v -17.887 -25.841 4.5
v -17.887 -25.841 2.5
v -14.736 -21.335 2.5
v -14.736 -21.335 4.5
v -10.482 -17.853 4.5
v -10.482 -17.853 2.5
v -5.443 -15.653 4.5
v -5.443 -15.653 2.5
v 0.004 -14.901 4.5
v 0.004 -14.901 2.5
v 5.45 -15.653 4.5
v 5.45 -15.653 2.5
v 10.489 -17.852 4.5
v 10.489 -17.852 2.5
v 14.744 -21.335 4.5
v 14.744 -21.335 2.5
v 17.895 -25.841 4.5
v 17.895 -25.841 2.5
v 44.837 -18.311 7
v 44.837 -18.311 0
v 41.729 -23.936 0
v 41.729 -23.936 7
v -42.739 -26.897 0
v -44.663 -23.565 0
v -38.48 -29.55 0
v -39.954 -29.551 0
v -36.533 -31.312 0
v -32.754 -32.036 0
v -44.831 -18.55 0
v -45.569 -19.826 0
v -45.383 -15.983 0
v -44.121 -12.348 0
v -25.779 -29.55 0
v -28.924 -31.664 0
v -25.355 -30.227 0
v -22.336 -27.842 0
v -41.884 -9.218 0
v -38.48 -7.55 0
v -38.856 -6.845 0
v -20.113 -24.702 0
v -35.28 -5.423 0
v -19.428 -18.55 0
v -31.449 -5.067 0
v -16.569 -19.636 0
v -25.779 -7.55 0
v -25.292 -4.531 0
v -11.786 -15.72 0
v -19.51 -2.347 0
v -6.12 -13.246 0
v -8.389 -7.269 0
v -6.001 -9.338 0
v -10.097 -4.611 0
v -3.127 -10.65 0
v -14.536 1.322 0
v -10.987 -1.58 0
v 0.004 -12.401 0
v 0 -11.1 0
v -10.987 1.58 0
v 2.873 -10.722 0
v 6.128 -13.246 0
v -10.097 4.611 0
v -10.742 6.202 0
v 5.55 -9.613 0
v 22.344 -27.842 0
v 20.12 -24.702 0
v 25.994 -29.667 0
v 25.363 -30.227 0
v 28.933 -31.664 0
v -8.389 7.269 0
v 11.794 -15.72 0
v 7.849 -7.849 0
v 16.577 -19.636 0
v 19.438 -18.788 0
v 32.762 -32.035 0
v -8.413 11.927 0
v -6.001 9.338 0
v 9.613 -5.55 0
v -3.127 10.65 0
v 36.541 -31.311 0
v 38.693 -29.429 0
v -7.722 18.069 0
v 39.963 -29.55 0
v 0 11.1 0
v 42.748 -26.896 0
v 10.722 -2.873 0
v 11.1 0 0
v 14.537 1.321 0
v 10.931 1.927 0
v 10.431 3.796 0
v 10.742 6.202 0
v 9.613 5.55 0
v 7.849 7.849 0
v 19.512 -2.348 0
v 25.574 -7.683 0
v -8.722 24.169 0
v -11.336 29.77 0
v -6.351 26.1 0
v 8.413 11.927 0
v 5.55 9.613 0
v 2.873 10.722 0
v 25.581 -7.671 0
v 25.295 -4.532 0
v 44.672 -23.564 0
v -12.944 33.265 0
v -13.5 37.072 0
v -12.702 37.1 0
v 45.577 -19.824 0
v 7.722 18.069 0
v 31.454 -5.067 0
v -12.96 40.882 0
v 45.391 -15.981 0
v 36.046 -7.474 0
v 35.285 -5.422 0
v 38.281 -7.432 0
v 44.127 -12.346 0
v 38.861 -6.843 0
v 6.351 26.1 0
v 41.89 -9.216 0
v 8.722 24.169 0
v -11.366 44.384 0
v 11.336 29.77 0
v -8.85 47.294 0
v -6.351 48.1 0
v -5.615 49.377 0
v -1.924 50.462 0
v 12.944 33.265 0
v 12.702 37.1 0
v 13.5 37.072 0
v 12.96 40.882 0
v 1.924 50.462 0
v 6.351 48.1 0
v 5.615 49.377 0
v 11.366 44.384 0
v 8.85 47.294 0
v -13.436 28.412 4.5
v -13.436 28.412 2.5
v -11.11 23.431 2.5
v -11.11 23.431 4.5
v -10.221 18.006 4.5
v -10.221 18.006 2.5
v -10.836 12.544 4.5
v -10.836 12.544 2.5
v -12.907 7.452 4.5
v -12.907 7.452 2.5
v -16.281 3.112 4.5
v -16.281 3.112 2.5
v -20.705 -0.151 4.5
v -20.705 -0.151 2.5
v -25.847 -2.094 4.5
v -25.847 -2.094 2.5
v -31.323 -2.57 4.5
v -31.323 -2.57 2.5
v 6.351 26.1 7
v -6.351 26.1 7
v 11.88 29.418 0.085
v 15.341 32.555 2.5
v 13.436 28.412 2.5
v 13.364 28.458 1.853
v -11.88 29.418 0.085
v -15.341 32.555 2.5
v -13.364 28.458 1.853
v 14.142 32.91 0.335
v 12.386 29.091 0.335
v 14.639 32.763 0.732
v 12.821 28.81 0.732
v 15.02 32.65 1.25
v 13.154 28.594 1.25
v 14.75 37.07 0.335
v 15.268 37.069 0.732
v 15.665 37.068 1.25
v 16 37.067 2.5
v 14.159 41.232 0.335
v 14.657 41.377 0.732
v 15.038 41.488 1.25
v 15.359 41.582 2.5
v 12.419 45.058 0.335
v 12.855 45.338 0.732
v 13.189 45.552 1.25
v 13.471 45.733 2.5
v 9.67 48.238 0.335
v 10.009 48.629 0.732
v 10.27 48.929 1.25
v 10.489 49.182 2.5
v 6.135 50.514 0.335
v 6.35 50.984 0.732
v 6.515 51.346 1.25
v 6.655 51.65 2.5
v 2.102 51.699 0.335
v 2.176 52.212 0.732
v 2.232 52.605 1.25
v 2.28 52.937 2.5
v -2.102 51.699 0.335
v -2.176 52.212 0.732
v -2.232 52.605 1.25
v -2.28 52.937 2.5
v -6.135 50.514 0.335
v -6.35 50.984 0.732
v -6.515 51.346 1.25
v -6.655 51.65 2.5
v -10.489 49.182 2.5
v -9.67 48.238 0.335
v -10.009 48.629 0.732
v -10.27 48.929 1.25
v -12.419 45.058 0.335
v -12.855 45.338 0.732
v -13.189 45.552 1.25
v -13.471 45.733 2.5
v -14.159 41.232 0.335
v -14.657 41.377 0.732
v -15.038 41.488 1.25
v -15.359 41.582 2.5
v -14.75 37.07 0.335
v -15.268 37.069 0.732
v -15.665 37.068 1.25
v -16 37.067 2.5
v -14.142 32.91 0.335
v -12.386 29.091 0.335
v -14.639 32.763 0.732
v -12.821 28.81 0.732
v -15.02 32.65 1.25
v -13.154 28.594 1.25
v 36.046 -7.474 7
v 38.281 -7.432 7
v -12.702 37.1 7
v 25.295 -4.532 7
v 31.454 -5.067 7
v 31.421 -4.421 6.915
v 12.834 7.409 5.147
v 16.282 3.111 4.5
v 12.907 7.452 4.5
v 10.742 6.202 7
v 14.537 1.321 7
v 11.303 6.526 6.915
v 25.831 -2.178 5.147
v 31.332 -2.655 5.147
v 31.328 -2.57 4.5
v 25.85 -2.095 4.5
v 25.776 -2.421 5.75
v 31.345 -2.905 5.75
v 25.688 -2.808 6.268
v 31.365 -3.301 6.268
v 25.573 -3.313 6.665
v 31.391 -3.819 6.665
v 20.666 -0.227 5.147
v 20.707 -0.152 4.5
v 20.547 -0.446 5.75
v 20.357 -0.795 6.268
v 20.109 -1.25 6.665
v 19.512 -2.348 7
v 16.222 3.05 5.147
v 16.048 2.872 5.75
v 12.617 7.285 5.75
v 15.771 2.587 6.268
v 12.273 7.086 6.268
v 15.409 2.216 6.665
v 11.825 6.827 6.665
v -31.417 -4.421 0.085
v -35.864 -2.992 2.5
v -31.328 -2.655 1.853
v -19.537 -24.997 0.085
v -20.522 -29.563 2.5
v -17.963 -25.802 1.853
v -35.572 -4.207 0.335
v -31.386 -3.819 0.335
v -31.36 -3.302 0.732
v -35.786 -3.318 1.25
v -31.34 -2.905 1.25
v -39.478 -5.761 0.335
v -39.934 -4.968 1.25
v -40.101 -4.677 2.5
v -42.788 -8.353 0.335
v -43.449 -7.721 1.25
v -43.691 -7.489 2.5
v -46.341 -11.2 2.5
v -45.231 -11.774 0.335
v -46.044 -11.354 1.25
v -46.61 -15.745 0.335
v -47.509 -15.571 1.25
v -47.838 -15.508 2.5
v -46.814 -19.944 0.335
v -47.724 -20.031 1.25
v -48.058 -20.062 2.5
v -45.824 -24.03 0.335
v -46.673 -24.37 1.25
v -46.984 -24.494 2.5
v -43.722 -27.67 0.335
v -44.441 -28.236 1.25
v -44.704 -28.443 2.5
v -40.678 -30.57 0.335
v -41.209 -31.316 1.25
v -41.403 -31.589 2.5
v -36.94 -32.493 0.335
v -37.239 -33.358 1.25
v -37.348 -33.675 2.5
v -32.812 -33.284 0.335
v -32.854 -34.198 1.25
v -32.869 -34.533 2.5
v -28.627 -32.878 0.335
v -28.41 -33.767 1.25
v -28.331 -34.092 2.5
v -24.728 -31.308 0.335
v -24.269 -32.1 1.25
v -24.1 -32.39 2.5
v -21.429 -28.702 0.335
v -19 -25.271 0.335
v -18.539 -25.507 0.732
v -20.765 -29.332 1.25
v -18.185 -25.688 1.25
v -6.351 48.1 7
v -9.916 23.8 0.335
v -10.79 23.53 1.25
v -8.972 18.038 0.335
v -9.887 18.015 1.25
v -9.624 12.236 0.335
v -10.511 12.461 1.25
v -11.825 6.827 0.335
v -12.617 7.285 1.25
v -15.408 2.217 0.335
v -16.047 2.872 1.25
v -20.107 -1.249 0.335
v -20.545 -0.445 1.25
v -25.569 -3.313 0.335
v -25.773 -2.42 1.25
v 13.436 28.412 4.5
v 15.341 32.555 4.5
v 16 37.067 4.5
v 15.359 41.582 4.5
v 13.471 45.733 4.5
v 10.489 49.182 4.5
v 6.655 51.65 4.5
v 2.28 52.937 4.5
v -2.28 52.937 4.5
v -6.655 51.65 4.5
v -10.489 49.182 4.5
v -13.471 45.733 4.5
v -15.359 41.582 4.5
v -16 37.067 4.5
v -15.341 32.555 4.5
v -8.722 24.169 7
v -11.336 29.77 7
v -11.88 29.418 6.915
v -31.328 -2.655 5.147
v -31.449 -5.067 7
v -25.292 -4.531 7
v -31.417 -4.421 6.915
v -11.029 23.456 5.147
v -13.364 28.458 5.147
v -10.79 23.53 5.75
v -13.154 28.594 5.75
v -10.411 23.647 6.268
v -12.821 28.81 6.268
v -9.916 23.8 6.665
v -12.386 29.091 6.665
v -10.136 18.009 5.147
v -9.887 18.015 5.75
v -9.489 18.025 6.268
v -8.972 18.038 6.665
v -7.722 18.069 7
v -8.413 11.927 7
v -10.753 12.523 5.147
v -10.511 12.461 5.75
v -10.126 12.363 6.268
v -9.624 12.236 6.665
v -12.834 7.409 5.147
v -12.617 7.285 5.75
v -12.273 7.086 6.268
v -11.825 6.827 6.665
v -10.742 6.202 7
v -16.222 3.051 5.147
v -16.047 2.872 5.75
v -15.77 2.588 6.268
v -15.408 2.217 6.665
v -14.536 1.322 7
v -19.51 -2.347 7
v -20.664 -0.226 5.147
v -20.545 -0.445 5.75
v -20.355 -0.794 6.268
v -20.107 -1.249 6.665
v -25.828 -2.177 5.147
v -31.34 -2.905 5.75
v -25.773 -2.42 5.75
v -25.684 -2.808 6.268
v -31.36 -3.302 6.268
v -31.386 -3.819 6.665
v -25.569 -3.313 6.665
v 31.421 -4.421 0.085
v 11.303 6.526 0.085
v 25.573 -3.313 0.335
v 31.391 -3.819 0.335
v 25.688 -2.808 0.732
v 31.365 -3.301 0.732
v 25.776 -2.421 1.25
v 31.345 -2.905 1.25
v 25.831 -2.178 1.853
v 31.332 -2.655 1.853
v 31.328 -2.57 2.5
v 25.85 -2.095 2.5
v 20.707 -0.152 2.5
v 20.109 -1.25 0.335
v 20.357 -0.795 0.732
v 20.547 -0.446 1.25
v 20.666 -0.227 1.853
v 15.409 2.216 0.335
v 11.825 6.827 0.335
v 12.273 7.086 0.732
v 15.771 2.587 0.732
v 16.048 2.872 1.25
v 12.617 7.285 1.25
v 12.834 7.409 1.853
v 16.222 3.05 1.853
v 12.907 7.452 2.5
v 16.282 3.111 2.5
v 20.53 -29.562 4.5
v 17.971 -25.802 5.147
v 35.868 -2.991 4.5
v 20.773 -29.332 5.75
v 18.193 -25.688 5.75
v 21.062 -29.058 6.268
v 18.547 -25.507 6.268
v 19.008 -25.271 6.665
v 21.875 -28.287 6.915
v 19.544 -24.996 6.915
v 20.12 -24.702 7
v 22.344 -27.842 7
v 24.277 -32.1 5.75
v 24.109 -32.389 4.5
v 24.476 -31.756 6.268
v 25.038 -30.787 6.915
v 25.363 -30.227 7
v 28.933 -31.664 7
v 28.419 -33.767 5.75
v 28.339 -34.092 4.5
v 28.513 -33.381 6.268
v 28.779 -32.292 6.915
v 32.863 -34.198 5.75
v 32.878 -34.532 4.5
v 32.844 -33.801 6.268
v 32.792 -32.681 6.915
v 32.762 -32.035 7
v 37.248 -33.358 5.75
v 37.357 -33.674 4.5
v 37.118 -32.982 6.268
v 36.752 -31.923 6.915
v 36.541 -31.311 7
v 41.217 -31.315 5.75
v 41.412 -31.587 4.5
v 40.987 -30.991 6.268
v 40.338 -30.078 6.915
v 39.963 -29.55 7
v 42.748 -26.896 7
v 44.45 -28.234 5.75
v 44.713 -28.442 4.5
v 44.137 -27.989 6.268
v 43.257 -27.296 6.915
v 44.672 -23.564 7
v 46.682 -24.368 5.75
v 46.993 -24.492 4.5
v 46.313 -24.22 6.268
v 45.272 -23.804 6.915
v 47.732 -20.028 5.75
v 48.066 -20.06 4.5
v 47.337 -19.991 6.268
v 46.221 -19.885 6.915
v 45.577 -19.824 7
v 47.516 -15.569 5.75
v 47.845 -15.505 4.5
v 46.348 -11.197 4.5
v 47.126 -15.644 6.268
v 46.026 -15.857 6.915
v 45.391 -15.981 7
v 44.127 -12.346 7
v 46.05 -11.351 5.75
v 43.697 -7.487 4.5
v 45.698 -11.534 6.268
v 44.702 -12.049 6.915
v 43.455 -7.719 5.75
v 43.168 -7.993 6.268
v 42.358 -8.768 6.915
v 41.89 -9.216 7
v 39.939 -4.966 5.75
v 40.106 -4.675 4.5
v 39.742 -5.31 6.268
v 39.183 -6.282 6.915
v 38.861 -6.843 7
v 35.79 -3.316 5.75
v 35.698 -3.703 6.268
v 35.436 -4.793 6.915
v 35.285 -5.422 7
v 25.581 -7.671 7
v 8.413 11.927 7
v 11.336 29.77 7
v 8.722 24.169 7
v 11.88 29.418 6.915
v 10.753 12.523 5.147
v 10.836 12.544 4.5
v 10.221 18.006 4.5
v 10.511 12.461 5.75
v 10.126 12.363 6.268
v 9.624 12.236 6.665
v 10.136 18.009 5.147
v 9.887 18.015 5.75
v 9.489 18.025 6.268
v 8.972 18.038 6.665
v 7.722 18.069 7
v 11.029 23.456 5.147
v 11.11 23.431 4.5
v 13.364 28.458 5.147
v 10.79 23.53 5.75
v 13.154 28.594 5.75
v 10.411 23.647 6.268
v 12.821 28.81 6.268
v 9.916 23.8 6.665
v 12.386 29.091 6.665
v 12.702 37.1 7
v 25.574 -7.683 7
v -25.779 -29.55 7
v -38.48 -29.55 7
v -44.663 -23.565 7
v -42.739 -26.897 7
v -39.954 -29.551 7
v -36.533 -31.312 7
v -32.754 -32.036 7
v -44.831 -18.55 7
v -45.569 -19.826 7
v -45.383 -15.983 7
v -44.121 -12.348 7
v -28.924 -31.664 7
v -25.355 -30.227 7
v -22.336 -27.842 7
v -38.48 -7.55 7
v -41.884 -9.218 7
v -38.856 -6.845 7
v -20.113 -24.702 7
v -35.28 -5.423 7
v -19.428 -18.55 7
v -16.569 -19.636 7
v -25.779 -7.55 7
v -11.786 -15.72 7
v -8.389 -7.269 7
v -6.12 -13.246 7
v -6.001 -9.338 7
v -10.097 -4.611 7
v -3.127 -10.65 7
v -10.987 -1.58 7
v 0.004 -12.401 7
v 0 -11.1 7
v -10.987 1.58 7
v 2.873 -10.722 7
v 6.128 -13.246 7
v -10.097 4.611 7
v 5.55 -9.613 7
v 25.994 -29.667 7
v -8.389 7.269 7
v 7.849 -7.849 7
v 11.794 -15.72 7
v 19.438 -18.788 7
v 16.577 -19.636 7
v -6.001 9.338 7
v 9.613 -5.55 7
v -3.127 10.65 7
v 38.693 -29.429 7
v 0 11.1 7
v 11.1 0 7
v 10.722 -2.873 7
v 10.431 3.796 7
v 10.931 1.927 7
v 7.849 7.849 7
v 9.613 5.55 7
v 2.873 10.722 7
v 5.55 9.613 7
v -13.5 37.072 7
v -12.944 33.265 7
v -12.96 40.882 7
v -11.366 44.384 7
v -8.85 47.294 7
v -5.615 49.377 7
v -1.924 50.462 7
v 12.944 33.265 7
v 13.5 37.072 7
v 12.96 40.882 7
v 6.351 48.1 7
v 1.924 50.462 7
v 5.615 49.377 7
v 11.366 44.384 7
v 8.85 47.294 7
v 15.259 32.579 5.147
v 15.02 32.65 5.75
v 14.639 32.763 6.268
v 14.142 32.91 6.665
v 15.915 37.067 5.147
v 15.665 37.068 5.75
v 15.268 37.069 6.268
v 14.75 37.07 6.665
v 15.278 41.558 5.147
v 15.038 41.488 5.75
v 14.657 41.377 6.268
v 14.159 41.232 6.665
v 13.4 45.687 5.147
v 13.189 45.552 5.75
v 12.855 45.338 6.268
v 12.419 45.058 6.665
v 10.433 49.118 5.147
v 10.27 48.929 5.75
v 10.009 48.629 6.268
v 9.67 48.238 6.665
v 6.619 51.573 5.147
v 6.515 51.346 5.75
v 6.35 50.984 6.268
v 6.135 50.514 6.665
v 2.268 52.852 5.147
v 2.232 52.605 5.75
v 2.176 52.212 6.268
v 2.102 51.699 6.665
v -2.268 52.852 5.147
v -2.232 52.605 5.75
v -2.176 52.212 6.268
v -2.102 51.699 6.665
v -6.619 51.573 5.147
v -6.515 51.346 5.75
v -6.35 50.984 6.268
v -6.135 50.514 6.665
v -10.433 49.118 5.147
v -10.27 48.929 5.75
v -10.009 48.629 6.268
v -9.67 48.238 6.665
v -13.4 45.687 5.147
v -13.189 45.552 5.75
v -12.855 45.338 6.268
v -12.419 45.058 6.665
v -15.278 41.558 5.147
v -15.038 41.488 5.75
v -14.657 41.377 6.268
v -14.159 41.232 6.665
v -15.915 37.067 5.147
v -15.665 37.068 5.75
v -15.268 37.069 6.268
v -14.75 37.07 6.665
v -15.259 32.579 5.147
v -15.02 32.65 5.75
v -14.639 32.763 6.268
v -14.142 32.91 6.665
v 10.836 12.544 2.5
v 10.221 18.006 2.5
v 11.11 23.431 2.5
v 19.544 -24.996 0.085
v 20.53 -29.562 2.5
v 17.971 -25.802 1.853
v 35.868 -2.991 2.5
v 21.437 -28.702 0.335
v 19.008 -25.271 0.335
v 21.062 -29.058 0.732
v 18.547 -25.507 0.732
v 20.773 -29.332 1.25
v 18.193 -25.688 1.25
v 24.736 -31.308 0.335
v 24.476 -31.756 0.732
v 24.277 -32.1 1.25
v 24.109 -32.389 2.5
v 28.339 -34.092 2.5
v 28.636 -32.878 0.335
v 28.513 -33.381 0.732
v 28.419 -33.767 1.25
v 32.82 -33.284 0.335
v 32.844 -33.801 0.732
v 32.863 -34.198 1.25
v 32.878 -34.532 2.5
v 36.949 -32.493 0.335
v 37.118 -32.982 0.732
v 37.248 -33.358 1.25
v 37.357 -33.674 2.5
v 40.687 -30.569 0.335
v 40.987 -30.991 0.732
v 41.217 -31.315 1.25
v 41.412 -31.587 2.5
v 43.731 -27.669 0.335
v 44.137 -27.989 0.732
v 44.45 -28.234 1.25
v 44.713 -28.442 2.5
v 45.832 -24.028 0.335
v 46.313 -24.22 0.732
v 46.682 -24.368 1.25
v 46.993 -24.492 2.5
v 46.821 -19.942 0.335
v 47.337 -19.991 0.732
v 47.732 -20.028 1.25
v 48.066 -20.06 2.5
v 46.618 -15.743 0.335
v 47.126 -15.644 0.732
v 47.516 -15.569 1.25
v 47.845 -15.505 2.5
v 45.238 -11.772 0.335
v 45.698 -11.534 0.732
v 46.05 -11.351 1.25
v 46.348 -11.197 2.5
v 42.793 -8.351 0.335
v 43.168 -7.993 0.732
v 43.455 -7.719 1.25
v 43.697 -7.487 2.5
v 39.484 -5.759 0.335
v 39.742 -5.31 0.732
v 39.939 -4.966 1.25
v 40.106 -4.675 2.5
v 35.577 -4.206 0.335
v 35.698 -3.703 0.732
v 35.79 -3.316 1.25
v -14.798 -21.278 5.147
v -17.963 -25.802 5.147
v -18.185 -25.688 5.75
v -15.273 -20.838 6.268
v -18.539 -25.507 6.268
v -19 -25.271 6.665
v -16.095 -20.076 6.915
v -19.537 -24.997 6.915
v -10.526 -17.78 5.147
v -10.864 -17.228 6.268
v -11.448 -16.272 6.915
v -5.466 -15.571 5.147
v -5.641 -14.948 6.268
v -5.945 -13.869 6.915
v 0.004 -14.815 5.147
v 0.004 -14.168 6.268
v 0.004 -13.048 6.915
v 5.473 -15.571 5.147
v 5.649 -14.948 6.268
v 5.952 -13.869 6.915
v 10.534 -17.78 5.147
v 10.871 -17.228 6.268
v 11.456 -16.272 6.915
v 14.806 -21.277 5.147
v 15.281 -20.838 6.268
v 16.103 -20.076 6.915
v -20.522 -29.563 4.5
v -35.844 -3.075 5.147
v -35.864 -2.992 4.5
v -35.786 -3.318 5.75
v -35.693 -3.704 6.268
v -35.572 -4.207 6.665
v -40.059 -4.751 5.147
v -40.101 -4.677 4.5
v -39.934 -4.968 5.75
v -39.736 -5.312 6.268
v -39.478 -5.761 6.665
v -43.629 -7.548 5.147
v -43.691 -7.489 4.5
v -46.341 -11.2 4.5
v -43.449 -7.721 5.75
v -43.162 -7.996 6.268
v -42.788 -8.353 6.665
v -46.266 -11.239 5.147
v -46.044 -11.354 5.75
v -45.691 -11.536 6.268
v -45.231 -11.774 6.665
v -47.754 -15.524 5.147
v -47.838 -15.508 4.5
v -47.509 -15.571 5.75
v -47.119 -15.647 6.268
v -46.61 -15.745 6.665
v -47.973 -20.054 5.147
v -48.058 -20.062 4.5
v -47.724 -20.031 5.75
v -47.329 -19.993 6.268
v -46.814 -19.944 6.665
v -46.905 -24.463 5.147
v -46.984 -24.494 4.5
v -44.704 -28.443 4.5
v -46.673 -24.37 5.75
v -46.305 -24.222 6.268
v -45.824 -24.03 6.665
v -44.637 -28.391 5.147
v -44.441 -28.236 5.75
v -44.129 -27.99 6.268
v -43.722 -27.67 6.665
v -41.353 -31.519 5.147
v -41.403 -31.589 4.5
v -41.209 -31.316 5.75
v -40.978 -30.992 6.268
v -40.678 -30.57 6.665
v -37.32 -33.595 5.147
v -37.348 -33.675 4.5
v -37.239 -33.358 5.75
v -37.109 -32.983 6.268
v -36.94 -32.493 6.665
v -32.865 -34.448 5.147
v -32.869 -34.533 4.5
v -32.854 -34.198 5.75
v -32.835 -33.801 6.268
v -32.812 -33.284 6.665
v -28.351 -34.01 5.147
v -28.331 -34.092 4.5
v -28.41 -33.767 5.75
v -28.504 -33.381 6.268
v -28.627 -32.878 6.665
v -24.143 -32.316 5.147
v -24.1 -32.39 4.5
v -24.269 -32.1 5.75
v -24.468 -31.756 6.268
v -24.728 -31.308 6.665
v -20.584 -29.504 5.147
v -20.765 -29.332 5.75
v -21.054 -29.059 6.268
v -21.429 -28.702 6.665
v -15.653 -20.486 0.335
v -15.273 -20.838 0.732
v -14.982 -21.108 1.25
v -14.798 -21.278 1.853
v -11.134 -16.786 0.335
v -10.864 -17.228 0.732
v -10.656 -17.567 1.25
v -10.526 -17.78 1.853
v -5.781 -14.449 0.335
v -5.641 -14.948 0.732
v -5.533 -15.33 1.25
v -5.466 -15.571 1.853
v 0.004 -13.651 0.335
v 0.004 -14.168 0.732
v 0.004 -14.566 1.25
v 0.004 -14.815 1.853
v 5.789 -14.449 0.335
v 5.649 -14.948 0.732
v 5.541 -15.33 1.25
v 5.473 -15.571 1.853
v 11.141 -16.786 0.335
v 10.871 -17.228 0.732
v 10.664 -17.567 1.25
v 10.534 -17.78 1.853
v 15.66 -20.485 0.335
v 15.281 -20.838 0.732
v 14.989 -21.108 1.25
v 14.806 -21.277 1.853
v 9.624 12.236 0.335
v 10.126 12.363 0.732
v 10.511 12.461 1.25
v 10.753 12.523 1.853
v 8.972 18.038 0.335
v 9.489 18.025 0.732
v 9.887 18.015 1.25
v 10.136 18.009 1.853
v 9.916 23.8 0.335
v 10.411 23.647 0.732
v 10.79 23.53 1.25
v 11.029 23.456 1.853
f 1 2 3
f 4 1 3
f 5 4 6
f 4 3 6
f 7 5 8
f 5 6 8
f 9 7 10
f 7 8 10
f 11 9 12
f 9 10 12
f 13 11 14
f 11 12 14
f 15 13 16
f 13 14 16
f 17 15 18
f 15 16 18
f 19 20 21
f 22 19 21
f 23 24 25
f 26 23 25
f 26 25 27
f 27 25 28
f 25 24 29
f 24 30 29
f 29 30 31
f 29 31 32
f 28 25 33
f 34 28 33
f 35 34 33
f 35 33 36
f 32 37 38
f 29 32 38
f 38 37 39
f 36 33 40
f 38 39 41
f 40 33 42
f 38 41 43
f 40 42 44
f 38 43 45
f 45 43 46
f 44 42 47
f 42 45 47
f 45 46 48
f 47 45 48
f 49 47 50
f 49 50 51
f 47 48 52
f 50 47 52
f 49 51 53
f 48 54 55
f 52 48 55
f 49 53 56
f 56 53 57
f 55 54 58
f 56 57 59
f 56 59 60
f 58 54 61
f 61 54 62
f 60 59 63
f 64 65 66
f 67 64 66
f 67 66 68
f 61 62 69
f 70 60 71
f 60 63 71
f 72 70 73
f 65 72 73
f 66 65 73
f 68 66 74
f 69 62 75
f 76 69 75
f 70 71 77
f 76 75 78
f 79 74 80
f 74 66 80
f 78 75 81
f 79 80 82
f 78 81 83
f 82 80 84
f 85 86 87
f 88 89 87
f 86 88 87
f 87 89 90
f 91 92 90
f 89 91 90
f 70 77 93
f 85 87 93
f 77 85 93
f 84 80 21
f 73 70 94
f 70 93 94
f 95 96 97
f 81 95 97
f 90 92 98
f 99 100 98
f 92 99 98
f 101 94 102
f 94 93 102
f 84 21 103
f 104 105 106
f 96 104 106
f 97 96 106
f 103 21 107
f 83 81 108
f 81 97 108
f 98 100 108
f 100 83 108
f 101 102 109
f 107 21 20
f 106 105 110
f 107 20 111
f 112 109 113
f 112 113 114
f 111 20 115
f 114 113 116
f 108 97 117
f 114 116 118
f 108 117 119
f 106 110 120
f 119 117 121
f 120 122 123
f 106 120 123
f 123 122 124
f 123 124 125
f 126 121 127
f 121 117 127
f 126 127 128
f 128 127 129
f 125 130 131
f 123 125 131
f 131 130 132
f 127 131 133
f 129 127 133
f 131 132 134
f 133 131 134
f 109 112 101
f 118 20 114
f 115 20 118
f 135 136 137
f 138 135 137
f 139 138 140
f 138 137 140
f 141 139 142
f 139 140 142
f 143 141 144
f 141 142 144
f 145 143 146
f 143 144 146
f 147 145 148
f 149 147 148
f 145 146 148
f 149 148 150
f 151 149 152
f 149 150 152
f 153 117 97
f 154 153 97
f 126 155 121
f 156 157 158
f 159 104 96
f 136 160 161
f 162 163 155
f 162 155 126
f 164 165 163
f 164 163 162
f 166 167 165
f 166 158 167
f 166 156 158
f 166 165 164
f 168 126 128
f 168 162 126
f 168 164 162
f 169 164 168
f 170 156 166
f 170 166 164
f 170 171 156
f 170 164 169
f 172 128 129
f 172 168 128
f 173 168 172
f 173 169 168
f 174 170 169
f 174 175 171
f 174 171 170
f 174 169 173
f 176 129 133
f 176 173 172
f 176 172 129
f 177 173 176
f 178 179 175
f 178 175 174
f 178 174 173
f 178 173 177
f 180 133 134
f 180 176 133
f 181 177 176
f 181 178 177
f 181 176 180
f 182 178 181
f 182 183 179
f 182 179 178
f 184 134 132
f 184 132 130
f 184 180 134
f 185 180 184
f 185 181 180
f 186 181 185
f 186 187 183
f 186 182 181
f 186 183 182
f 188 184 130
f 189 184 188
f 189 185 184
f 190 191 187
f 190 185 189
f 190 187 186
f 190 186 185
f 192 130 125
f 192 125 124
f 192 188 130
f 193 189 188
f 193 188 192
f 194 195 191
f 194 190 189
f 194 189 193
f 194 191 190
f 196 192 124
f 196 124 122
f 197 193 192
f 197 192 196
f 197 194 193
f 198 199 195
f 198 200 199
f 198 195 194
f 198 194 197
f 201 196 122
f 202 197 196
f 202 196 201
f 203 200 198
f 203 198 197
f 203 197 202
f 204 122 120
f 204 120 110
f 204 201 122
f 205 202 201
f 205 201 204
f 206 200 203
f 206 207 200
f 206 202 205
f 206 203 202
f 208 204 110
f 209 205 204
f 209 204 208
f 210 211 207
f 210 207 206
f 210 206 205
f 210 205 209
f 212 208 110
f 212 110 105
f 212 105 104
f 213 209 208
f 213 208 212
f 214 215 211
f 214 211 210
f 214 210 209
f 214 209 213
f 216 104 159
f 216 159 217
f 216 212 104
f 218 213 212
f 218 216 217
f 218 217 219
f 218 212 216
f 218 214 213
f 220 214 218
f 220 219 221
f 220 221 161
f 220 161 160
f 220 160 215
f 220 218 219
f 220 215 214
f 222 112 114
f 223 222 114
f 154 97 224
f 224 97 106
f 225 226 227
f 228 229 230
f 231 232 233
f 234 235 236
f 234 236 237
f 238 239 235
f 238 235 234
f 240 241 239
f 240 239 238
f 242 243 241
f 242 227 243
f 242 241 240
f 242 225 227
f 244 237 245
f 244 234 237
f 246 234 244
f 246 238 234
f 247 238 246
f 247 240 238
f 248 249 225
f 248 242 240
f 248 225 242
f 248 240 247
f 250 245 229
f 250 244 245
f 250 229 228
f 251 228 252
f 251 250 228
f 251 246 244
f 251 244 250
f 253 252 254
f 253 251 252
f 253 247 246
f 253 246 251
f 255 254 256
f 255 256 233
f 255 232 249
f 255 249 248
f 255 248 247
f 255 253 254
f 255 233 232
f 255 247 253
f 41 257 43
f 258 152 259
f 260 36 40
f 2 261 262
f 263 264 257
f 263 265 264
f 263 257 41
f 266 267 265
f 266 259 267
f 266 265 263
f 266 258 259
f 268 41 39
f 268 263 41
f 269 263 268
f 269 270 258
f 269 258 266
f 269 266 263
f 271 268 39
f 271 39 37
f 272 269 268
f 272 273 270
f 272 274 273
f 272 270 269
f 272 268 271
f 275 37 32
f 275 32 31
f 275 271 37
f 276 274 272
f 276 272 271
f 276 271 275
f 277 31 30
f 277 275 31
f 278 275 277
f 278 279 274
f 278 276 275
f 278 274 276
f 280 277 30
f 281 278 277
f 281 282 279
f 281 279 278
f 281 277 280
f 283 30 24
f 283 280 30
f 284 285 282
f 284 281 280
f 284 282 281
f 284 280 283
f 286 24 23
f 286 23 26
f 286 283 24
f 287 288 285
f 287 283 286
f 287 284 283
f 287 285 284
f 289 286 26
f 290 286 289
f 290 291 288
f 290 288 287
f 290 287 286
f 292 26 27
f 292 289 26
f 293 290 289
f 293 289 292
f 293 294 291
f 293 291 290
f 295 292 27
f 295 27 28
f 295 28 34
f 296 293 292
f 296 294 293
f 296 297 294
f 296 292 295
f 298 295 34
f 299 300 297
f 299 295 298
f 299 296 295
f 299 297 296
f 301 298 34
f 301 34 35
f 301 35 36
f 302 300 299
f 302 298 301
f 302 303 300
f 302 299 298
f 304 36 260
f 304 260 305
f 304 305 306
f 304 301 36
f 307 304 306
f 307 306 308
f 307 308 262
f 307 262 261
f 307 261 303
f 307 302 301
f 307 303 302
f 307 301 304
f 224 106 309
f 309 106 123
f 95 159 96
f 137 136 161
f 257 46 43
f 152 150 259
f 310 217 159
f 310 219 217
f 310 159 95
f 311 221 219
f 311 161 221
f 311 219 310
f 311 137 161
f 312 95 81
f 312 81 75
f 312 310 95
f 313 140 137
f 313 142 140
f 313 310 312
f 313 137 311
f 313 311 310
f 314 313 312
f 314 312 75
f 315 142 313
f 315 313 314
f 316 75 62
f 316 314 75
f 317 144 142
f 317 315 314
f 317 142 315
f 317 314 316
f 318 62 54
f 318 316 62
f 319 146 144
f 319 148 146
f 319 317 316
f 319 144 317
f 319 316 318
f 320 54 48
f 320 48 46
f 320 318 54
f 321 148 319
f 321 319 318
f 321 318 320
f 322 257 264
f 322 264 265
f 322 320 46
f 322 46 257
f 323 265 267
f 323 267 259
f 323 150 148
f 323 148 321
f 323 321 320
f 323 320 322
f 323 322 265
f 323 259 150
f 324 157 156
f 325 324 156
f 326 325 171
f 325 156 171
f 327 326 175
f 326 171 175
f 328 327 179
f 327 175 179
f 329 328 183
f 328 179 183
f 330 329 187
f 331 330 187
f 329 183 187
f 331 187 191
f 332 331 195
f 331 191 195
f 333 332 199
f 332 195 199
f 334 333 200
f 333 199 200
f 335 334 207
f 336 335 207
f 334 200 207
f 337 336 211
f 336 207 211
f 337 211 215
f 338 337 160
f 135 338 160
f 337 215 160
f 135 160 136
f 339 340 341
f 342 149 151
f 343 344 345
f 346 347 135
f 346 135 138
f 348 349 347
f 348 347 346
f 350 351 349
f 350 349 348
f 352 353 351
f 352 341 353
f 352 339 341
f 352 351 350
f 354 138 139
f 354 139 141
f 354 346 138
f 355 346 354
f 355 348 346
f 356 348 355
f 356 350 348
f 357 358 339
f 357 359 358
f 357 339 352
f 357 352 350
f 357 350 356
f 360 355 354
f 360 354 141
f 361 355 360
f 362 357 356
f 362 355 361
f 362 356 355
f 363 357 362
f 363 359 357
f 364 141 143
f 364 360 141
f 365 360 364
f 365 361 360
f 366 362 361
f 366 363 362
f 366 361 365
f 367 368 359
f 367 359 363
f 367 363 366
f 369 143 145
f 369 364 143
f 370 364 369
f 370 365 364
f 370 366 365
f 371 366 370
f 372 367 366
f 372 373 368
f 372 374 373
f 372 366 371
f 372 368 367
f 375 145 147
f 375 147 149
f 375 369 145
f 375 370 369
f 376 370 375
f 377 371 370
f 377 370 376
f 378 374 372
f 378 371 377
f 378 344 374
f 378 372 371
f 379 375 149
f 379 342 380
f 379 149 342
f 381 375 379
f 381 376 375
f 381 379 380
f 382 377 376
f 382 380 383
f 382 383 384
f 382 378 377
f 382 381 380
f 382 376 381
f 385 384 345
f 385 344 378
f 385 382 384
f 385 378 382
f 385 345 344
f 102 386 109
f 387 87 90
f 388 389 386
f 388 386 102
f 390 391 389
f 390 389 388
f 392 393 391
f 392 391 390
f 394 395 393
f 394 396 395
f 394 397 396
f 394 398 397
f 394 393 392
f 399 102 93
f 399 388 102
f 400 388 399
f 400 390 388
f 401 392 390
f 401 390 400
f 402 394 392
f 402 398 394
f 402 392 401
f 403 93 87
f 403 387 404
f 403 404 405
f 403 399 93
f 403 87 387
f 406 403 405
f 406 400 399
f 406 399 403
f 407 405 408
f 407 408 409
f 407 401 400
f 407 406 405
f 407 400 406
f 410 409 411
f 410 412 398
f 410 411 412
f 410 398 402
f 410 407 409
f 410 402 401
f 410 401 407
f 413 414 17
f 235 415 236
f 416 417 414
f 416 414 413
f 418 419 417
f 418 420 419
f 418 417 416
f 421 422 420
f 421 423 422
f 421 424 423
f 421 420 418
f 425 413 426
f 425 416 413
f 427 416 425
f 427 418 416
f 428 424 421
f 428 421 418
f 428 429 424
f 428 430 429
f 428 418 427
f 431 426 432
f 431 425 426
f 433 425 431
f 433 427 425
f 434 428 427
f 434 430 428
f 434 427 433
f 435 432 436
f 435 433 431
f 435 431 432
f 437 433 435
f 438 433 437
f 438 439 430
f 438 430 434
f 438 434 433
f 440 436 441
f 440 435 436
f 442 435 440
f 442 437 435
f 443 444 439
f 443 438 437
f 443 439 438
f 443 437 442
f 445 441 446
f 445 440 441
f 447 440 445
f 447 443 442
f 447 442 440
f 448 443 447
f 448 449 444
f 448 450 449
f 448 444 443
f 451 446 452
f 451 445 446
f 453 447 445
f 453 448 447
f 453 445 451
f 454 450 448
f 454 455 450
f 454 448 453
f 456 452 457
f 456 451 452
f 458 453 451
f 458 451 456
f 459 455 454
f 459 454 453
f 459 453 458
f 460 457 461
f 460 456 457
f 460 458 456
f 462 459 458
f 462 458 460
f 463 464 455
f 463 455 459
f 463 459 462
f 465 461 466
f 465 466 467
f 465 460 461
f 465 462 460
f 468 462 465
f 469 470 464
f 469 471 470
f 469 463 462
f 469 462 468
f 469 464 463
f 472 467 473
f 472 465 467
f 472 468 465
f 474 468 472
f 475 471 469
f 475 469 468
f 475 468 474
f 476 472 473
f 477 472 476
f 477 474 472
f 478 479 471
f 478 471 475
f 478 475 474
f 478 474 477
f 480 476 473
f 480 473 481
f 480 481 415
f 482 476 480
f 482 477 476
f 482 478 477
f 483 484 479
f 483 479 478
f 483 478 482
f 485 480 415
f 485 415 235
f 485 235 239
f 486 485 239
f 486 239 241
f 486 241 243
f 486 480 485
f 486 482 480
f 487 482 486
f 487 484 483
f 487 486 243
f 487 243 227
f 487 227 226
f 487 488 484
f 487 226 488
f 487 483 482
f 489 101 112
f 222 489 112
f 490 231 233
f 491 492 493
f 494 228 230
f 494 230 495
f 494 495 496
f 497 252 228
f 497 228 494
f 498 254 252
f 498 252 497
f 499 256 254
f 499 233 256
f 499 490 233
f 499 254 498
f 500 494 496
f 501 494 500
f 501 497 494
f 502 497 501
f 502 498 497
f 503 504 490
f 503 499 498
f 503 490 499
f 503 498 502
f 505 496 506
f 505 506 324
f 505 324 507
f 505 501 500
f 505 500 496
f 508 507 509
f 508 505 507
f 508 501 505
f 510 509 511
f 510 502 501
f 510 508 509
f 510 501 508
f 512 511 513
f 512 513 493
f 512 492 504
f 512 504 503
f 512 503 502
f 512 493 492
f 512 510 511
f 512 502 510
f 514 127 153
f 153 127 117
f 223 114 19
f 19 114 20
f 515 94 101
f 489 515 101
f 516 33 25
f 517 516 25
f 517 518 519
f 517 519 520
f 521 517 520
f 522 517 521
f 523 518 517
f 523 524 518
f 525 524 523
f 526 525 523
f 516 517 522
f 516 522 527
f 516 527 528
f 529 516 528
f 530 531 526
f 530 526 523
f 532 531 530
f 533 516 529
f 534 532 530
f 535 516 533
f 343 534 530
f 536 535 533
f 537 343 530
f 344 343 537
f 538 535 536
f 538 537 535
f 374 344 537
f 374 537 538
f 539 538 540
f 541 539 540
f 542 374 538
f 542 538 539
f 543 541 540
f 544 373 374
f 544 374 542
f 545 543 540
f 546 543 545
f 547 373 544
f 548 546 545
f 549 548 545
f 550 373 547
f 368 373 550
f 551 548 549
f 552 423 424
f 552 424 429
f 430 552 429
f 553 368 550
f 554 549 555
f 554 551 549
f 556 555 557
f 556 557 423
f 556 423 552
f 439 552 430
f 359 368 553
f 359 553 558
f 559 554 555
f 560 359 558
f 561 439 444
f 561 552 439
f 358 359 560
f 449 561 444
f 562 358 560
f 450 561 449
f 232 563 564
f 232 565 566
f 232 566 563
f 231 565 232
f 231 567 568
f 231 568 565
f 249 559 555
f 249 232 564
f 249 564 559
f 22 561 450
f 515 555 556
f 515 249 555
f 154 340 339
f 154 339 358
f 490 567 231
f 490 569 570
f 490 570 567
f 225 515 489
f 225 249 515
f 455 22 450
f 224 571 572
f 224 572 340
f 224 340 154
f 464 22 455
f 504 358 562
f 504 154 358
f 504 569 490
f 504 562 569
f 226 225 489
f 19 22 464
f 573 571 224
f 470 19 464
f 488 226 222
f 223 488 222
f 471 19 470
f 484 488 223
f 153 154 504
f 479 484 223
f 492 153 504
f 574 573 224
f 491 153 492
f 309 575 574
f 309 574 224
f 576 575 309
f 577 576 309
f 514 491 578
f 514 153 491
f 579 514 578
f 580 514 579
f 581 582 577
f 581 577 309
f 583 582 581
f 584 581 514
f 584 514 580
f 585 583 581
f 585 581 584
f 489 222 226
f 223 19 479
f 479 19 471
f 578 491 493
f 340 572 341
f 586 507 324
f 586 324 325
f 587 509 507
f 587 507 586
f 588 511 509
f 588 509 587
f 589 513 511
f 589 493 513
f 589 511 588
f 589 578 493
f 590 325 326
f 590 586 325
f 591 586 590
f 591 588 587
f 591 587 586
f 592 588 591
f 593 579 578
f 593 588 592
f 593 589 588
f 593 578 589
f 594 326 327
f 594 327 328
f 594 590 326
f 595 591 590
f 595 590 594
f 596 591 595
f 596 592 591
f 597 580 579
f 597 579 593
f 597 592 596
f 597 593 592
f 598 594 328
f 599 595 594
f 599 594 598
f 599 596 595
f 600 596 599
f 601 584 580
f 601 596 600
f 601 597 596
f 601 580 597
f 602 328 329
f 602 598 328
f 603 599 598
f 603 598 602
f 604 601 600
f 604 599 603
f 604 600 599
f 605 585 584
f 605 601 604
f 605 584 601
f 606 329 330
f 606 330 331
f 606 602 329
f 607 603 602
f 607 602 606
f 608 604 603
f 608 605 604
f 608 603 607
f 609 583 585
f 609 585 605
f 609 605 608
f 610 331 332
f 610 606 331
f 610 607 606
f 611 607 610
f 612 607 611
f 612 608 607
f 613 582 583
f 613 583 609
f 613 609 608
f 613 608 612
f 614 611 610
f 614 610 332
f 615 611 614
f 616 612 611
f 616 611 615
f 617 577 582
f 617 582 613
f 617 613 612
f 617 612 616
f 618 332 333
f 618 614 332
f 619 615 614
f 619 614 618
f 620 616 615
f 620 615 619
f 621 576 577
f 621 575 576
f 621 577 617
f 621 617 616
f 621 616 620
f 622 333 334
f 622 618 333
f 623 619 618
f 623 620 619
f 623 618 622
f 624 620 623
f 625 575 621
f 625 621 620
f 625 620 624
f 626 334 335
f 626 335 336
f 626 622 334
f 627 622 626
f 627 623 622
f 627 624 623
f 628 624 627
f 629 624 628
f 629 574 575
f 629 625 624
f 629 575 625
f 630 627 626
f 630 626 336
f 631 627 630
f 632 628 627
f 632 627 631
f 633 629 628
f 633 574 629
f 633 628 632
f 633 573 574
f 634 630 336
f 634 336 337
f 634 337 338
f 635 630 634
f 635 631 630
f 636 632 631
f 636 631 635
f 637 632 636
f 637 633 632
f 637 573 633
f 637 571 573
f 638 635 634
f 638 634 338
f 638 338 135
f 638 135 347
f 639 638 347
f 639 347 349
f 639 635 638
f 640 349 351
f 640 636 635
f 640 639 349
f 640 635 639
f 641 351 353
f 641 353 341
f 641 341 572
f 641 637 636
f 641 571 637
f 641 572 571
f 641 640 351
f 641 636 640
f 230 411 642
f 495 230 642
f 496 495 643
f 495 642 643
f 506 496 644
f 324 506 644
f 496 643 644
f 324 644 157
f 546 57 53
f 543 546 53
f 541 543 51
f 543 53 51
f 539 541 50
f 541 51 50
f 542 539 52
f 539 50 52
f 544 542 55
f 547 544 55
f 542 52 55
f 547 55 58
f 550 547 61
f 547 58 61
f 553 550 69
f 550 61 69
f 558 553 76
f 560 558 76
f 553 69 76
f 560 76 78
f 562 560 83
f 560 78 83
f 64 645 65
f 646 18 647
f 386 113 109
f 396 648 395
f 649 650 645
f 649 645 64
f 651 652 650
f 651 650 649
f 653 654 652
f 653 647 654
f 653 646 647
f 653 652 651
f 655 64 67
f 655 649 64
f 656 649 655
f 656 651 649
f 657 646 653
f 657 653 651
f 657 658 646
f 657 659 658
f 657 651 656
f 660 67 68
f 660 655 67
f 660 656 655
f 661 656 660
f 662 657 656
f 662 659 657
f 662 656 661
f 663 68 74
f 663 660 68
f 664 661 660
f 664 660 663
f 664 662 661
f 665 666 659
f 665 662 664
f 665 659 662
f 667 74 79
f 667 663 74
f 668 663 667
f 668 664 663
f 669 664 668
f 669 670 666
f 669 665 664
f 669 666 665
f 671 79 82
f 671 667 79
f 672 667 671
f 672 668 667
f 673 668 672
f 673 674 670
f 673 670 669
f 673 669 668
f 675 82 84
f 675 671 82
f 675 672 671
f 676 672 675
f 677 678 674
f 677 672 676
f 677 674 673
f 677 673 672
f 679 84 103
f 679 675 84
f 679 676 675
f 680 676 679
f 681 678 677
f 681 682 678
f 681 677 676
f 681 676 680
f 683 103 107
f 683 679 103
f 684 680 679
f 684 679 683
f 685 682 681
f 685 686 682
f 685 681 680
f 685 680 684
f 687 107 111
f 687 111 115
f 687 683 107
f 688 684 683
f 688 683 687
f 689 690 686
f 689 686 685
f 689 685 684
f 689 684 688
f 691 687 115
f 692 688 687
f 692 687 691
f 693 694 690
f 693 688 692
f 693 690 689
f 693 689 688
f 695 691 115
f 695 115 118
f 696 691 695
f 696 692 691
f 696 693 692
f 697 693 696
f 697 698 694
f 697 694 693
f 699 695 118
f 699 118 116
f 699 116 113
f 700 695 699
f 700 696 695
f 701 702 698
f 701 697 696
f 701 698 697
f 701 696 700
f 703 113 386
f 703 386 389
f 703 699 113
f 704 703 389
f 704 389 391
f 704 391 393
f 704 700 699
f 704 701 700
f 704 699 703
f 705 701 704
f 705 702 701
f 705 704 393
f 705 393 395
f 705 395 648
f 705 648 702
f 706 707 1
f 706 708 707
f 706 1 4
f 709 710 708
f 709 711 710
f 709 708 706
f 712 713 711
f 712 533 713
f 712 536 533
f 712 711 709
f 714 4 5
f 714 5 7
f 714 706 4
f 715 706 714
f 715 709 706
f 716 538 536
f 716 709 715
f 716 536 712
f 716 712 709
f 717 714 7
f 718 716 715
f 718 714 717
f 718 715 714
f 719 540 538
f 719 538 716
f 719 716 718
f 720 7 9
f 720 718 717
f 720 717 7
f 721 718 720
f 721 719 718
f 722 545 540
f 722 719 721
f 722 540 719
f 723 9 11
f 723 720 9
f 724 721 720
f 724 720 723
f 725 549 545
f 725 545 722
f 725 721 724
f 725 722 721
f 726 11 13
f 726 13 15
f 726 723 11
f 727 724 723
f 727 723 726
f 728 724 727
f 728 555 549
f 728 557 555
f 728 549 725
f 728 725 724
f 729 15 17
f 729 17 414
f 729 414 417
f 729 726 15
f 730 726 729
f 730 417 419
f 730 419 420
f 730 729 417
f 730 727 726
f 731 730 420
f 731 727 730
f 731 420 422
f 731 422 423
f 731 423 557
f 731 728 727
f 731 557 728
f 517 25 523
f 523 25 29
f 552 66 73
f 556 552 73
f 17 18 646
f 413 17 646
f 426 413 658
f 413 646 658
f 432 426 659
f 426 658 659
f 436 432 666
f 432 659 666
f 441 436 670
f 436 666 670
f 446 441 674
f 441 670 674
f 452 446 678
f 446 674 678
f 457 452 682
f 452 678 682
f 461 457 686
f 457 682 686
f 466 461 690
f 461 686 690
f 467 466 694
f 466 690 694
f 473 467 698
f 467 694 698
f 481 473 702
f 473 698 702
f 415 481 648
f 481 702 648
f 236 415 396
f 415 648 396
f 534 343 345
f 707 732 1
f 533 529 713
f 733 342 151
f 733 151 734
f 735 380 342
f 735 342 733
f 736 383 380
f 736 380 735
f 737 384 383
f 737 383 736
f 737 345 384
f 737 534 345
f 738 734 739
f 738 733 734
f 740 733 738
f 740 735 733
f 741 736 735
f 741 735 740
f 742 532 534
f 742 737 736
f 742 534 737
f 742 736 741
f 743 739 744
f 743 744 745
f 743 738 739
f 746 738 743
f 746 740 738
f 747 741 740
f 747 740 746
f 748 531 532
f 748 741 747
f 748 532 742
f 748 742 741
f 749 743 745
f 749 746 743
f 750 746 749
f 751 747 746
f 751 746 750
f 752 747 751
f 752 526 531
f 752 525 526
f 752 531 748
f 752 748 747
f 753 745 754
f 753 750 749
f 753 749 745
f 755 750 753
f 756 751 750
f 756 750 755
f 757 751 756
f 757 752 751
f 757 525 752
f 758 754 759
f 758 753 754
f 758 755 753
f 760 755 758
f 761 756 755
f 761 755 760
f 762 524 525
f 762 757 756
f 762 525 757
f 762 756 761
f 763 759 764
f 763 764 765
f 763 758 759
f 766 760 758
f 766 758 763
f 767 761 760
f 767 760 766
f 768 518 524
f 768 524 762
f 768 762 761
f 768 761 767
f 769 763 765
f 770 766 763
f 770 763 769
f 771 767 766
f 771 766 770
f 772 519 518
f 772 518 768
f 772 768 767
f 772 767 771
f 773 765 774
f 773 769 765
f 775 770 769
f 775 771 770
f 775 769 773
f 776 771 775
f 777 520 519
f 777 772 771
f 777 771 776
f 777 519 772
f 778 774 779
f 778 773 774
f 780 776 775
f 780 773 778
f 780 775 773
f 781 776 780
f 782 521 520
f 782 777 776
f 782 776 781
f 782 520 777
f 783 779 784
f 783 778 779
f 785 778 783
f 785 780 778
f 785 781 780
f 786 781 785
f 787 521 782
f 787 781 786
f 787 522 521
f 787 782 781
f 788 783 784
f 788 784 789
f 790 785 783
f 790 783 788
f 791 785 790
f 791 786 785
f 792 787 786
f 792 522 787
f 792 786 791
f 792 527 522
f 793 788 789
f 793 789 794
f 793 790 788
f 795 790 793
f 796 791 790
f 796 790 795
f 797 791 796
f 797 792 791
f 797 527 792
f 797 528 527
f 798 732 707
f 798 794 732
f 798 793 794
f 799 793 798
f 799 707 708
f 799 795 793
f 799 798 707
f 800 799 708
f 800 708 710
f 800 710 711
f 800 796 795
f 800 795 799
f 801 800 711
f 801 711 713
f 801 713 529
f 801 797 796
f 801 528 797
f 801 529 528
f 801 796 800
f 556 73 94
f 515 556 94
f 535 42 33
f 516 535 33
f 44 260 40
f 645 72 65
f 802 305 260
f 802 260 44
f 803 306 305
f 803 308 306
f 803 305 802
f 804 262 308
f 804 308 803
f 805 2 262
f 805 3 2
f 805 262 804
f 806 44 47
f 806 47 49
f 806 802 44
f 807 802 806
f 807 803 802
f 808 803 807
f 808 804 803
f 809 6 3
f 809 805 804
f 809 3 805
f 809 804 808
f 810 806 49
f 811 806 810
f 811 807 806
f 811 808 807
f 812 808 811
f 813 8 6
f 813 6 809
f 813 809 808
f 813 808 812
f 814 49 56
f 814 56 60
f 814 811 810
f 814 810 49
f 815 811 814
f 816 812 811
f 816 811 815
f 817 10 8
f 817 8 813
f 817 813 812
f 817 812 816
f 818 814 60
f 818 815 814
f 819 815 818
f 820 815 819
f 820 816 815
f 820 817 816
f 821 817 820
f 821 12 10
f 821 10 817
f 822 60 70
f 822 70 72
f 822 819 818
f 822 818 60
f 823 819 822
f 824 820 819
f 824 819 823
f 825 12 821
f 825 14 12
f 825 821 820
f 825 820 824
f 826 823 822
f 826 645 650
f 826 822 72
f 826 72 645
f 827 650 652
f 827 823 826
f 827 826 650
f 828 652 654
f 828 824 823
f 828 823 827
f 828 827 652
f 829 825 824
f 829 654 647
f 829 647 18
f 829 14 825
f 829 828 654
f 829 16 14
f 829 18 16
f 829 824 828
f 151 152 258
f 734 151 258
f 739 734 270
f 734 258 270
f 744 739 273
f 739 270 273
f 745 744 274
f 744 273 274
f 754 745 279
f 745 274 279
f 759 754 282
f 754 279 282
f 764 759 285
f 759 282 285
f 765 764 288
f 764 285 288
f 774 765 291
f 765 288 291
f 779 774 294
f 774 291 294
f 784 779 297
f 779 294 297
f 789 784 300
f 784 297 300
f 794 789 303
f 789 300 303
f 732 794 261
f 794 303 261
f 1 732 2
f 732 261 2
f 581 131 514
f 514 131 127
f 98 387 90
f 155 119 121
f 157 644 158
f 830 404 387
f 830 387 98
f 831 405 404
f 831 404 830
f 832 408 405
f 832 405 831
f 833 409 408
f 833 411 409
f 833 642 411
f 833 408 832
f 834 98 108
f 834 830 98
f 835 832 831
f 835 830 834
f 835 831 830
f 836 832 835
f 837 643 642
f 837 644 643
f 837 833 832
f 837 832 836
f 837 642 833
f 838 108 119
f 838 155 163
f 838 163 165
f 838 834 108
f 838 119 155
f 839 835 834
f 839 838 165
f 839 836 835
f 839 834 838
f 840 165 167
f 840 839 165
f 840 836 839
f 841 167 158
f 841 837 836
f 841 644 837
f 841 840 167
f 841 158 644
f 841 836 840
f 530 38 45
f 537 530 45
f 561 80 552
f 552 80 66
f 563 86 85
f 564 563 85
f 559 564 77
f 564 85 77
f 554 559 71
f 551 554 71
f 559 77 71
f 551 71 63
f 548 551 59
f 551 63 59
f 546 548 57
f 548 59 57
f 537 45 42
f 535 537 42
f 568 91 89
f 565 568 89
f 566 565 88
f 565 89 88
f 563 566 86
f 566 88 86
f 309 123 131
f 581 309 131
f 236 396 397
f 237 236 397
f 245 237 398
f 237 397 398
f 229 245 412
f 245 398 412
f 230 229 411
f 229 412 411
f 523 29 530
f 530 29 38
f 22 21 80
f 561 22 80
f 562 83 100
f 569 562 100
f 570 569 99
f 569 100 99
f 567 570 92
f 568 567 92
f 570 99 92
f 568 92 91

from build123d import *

# Parameters (mm, degrees)
F1_DEPTH = 7
F2_R     = 2.5
F3_R     = 2.5


with BuildPart() as f1:
    # F0 (on Top) → F1 (new body)
    with BuildSketch(Plane.XY):
        with BuildLine():
            ThreePointArc((31.327672, -2.570105), (20.706606, -0.152215), (12.907377, 7.452078))
            ThreePointArc((12.907377, 7.452078), (10.221426, 18.006415), (13.435736, 28.412019))
            ThreePointArc((13.435736, 28.412019), (0, 53.1), (-13.435736, 28.412019))
            ThreePointArc((-13.435736, 28.412019), (-12.907377, 7.452078), (-31.323398, -2.570321))
            ThreePointArc((-31.323398, -2.570321), (-45.98575, -26.550344), (-17.8873, -25.84099))
            ThreePointArc((-17.8873, -25.84099), (0.003816, -14.90065), (17.895065, -25.840774))
            ThreePointArc((17.895065, -25.840774), (45.994326, -26.548397), (31.327672, -2.570105))
        make_face()
        Polygon((-38.480395, -29.55), (-44.831248, -18.55), (-38.480395, -7.55), (-25.77869, -7.55), (-19.427837, -18.55), (-25.77869, -29.55), align=None, mode=Mode.SUBTRACT)
        with BuildLine():
            ThreePointArc((0, -11.1), (-11.1, 0), (0, 11.1))
            ThreePointArc((0, 11.1), (5.55, 9.612882), (9.612882, 5.55))
            ThreePointArc((9.612882, 5.55), (10.721777, 2.872891), (11.1, 0))
            ThreePointArc((11.1, 0), (7.848885, -7.848885), (0, -11.1))
        make_face(mode=Mode.SUBTRACT)
        Polygon((36.045783, -7.474326), (38.280562, -7.432388), (44.836689, -18.311291), (41.728522, -23.935946), (38.693346, -29.428515), (25.993876, -29.666836), (19.437749, -18.787933), (25.574427, -7.68277), (25.581092, -7.670709), align=None, mode=Mode.SUBTRACT)
        Polygon((6.350853, 48.1), (12.701706, 37.1), (6.350853, 26.1), (-6.350853, 26.1), (-12.701706, 37.1), (-6.350853, 48.1), align=None, mode=Mode.SUBTRACT)
    extrude(amount=F1_DEPTH)

    # F2
    f2_edges = [f1.edges().sort_by_distance(p)[0] for p in [
        (45.994326, -26.548397, 7),
    ]]
    fillet(f2_edges, radius=F2_R)

    # F3
    f3_edges = [f1.edges().sort_by_distance(p)[0] for p in [
        (-45.98575, -26.550344, 0),
    ]]
    fillet(f3_edges, radius=F3_R)


solid = f1.part
